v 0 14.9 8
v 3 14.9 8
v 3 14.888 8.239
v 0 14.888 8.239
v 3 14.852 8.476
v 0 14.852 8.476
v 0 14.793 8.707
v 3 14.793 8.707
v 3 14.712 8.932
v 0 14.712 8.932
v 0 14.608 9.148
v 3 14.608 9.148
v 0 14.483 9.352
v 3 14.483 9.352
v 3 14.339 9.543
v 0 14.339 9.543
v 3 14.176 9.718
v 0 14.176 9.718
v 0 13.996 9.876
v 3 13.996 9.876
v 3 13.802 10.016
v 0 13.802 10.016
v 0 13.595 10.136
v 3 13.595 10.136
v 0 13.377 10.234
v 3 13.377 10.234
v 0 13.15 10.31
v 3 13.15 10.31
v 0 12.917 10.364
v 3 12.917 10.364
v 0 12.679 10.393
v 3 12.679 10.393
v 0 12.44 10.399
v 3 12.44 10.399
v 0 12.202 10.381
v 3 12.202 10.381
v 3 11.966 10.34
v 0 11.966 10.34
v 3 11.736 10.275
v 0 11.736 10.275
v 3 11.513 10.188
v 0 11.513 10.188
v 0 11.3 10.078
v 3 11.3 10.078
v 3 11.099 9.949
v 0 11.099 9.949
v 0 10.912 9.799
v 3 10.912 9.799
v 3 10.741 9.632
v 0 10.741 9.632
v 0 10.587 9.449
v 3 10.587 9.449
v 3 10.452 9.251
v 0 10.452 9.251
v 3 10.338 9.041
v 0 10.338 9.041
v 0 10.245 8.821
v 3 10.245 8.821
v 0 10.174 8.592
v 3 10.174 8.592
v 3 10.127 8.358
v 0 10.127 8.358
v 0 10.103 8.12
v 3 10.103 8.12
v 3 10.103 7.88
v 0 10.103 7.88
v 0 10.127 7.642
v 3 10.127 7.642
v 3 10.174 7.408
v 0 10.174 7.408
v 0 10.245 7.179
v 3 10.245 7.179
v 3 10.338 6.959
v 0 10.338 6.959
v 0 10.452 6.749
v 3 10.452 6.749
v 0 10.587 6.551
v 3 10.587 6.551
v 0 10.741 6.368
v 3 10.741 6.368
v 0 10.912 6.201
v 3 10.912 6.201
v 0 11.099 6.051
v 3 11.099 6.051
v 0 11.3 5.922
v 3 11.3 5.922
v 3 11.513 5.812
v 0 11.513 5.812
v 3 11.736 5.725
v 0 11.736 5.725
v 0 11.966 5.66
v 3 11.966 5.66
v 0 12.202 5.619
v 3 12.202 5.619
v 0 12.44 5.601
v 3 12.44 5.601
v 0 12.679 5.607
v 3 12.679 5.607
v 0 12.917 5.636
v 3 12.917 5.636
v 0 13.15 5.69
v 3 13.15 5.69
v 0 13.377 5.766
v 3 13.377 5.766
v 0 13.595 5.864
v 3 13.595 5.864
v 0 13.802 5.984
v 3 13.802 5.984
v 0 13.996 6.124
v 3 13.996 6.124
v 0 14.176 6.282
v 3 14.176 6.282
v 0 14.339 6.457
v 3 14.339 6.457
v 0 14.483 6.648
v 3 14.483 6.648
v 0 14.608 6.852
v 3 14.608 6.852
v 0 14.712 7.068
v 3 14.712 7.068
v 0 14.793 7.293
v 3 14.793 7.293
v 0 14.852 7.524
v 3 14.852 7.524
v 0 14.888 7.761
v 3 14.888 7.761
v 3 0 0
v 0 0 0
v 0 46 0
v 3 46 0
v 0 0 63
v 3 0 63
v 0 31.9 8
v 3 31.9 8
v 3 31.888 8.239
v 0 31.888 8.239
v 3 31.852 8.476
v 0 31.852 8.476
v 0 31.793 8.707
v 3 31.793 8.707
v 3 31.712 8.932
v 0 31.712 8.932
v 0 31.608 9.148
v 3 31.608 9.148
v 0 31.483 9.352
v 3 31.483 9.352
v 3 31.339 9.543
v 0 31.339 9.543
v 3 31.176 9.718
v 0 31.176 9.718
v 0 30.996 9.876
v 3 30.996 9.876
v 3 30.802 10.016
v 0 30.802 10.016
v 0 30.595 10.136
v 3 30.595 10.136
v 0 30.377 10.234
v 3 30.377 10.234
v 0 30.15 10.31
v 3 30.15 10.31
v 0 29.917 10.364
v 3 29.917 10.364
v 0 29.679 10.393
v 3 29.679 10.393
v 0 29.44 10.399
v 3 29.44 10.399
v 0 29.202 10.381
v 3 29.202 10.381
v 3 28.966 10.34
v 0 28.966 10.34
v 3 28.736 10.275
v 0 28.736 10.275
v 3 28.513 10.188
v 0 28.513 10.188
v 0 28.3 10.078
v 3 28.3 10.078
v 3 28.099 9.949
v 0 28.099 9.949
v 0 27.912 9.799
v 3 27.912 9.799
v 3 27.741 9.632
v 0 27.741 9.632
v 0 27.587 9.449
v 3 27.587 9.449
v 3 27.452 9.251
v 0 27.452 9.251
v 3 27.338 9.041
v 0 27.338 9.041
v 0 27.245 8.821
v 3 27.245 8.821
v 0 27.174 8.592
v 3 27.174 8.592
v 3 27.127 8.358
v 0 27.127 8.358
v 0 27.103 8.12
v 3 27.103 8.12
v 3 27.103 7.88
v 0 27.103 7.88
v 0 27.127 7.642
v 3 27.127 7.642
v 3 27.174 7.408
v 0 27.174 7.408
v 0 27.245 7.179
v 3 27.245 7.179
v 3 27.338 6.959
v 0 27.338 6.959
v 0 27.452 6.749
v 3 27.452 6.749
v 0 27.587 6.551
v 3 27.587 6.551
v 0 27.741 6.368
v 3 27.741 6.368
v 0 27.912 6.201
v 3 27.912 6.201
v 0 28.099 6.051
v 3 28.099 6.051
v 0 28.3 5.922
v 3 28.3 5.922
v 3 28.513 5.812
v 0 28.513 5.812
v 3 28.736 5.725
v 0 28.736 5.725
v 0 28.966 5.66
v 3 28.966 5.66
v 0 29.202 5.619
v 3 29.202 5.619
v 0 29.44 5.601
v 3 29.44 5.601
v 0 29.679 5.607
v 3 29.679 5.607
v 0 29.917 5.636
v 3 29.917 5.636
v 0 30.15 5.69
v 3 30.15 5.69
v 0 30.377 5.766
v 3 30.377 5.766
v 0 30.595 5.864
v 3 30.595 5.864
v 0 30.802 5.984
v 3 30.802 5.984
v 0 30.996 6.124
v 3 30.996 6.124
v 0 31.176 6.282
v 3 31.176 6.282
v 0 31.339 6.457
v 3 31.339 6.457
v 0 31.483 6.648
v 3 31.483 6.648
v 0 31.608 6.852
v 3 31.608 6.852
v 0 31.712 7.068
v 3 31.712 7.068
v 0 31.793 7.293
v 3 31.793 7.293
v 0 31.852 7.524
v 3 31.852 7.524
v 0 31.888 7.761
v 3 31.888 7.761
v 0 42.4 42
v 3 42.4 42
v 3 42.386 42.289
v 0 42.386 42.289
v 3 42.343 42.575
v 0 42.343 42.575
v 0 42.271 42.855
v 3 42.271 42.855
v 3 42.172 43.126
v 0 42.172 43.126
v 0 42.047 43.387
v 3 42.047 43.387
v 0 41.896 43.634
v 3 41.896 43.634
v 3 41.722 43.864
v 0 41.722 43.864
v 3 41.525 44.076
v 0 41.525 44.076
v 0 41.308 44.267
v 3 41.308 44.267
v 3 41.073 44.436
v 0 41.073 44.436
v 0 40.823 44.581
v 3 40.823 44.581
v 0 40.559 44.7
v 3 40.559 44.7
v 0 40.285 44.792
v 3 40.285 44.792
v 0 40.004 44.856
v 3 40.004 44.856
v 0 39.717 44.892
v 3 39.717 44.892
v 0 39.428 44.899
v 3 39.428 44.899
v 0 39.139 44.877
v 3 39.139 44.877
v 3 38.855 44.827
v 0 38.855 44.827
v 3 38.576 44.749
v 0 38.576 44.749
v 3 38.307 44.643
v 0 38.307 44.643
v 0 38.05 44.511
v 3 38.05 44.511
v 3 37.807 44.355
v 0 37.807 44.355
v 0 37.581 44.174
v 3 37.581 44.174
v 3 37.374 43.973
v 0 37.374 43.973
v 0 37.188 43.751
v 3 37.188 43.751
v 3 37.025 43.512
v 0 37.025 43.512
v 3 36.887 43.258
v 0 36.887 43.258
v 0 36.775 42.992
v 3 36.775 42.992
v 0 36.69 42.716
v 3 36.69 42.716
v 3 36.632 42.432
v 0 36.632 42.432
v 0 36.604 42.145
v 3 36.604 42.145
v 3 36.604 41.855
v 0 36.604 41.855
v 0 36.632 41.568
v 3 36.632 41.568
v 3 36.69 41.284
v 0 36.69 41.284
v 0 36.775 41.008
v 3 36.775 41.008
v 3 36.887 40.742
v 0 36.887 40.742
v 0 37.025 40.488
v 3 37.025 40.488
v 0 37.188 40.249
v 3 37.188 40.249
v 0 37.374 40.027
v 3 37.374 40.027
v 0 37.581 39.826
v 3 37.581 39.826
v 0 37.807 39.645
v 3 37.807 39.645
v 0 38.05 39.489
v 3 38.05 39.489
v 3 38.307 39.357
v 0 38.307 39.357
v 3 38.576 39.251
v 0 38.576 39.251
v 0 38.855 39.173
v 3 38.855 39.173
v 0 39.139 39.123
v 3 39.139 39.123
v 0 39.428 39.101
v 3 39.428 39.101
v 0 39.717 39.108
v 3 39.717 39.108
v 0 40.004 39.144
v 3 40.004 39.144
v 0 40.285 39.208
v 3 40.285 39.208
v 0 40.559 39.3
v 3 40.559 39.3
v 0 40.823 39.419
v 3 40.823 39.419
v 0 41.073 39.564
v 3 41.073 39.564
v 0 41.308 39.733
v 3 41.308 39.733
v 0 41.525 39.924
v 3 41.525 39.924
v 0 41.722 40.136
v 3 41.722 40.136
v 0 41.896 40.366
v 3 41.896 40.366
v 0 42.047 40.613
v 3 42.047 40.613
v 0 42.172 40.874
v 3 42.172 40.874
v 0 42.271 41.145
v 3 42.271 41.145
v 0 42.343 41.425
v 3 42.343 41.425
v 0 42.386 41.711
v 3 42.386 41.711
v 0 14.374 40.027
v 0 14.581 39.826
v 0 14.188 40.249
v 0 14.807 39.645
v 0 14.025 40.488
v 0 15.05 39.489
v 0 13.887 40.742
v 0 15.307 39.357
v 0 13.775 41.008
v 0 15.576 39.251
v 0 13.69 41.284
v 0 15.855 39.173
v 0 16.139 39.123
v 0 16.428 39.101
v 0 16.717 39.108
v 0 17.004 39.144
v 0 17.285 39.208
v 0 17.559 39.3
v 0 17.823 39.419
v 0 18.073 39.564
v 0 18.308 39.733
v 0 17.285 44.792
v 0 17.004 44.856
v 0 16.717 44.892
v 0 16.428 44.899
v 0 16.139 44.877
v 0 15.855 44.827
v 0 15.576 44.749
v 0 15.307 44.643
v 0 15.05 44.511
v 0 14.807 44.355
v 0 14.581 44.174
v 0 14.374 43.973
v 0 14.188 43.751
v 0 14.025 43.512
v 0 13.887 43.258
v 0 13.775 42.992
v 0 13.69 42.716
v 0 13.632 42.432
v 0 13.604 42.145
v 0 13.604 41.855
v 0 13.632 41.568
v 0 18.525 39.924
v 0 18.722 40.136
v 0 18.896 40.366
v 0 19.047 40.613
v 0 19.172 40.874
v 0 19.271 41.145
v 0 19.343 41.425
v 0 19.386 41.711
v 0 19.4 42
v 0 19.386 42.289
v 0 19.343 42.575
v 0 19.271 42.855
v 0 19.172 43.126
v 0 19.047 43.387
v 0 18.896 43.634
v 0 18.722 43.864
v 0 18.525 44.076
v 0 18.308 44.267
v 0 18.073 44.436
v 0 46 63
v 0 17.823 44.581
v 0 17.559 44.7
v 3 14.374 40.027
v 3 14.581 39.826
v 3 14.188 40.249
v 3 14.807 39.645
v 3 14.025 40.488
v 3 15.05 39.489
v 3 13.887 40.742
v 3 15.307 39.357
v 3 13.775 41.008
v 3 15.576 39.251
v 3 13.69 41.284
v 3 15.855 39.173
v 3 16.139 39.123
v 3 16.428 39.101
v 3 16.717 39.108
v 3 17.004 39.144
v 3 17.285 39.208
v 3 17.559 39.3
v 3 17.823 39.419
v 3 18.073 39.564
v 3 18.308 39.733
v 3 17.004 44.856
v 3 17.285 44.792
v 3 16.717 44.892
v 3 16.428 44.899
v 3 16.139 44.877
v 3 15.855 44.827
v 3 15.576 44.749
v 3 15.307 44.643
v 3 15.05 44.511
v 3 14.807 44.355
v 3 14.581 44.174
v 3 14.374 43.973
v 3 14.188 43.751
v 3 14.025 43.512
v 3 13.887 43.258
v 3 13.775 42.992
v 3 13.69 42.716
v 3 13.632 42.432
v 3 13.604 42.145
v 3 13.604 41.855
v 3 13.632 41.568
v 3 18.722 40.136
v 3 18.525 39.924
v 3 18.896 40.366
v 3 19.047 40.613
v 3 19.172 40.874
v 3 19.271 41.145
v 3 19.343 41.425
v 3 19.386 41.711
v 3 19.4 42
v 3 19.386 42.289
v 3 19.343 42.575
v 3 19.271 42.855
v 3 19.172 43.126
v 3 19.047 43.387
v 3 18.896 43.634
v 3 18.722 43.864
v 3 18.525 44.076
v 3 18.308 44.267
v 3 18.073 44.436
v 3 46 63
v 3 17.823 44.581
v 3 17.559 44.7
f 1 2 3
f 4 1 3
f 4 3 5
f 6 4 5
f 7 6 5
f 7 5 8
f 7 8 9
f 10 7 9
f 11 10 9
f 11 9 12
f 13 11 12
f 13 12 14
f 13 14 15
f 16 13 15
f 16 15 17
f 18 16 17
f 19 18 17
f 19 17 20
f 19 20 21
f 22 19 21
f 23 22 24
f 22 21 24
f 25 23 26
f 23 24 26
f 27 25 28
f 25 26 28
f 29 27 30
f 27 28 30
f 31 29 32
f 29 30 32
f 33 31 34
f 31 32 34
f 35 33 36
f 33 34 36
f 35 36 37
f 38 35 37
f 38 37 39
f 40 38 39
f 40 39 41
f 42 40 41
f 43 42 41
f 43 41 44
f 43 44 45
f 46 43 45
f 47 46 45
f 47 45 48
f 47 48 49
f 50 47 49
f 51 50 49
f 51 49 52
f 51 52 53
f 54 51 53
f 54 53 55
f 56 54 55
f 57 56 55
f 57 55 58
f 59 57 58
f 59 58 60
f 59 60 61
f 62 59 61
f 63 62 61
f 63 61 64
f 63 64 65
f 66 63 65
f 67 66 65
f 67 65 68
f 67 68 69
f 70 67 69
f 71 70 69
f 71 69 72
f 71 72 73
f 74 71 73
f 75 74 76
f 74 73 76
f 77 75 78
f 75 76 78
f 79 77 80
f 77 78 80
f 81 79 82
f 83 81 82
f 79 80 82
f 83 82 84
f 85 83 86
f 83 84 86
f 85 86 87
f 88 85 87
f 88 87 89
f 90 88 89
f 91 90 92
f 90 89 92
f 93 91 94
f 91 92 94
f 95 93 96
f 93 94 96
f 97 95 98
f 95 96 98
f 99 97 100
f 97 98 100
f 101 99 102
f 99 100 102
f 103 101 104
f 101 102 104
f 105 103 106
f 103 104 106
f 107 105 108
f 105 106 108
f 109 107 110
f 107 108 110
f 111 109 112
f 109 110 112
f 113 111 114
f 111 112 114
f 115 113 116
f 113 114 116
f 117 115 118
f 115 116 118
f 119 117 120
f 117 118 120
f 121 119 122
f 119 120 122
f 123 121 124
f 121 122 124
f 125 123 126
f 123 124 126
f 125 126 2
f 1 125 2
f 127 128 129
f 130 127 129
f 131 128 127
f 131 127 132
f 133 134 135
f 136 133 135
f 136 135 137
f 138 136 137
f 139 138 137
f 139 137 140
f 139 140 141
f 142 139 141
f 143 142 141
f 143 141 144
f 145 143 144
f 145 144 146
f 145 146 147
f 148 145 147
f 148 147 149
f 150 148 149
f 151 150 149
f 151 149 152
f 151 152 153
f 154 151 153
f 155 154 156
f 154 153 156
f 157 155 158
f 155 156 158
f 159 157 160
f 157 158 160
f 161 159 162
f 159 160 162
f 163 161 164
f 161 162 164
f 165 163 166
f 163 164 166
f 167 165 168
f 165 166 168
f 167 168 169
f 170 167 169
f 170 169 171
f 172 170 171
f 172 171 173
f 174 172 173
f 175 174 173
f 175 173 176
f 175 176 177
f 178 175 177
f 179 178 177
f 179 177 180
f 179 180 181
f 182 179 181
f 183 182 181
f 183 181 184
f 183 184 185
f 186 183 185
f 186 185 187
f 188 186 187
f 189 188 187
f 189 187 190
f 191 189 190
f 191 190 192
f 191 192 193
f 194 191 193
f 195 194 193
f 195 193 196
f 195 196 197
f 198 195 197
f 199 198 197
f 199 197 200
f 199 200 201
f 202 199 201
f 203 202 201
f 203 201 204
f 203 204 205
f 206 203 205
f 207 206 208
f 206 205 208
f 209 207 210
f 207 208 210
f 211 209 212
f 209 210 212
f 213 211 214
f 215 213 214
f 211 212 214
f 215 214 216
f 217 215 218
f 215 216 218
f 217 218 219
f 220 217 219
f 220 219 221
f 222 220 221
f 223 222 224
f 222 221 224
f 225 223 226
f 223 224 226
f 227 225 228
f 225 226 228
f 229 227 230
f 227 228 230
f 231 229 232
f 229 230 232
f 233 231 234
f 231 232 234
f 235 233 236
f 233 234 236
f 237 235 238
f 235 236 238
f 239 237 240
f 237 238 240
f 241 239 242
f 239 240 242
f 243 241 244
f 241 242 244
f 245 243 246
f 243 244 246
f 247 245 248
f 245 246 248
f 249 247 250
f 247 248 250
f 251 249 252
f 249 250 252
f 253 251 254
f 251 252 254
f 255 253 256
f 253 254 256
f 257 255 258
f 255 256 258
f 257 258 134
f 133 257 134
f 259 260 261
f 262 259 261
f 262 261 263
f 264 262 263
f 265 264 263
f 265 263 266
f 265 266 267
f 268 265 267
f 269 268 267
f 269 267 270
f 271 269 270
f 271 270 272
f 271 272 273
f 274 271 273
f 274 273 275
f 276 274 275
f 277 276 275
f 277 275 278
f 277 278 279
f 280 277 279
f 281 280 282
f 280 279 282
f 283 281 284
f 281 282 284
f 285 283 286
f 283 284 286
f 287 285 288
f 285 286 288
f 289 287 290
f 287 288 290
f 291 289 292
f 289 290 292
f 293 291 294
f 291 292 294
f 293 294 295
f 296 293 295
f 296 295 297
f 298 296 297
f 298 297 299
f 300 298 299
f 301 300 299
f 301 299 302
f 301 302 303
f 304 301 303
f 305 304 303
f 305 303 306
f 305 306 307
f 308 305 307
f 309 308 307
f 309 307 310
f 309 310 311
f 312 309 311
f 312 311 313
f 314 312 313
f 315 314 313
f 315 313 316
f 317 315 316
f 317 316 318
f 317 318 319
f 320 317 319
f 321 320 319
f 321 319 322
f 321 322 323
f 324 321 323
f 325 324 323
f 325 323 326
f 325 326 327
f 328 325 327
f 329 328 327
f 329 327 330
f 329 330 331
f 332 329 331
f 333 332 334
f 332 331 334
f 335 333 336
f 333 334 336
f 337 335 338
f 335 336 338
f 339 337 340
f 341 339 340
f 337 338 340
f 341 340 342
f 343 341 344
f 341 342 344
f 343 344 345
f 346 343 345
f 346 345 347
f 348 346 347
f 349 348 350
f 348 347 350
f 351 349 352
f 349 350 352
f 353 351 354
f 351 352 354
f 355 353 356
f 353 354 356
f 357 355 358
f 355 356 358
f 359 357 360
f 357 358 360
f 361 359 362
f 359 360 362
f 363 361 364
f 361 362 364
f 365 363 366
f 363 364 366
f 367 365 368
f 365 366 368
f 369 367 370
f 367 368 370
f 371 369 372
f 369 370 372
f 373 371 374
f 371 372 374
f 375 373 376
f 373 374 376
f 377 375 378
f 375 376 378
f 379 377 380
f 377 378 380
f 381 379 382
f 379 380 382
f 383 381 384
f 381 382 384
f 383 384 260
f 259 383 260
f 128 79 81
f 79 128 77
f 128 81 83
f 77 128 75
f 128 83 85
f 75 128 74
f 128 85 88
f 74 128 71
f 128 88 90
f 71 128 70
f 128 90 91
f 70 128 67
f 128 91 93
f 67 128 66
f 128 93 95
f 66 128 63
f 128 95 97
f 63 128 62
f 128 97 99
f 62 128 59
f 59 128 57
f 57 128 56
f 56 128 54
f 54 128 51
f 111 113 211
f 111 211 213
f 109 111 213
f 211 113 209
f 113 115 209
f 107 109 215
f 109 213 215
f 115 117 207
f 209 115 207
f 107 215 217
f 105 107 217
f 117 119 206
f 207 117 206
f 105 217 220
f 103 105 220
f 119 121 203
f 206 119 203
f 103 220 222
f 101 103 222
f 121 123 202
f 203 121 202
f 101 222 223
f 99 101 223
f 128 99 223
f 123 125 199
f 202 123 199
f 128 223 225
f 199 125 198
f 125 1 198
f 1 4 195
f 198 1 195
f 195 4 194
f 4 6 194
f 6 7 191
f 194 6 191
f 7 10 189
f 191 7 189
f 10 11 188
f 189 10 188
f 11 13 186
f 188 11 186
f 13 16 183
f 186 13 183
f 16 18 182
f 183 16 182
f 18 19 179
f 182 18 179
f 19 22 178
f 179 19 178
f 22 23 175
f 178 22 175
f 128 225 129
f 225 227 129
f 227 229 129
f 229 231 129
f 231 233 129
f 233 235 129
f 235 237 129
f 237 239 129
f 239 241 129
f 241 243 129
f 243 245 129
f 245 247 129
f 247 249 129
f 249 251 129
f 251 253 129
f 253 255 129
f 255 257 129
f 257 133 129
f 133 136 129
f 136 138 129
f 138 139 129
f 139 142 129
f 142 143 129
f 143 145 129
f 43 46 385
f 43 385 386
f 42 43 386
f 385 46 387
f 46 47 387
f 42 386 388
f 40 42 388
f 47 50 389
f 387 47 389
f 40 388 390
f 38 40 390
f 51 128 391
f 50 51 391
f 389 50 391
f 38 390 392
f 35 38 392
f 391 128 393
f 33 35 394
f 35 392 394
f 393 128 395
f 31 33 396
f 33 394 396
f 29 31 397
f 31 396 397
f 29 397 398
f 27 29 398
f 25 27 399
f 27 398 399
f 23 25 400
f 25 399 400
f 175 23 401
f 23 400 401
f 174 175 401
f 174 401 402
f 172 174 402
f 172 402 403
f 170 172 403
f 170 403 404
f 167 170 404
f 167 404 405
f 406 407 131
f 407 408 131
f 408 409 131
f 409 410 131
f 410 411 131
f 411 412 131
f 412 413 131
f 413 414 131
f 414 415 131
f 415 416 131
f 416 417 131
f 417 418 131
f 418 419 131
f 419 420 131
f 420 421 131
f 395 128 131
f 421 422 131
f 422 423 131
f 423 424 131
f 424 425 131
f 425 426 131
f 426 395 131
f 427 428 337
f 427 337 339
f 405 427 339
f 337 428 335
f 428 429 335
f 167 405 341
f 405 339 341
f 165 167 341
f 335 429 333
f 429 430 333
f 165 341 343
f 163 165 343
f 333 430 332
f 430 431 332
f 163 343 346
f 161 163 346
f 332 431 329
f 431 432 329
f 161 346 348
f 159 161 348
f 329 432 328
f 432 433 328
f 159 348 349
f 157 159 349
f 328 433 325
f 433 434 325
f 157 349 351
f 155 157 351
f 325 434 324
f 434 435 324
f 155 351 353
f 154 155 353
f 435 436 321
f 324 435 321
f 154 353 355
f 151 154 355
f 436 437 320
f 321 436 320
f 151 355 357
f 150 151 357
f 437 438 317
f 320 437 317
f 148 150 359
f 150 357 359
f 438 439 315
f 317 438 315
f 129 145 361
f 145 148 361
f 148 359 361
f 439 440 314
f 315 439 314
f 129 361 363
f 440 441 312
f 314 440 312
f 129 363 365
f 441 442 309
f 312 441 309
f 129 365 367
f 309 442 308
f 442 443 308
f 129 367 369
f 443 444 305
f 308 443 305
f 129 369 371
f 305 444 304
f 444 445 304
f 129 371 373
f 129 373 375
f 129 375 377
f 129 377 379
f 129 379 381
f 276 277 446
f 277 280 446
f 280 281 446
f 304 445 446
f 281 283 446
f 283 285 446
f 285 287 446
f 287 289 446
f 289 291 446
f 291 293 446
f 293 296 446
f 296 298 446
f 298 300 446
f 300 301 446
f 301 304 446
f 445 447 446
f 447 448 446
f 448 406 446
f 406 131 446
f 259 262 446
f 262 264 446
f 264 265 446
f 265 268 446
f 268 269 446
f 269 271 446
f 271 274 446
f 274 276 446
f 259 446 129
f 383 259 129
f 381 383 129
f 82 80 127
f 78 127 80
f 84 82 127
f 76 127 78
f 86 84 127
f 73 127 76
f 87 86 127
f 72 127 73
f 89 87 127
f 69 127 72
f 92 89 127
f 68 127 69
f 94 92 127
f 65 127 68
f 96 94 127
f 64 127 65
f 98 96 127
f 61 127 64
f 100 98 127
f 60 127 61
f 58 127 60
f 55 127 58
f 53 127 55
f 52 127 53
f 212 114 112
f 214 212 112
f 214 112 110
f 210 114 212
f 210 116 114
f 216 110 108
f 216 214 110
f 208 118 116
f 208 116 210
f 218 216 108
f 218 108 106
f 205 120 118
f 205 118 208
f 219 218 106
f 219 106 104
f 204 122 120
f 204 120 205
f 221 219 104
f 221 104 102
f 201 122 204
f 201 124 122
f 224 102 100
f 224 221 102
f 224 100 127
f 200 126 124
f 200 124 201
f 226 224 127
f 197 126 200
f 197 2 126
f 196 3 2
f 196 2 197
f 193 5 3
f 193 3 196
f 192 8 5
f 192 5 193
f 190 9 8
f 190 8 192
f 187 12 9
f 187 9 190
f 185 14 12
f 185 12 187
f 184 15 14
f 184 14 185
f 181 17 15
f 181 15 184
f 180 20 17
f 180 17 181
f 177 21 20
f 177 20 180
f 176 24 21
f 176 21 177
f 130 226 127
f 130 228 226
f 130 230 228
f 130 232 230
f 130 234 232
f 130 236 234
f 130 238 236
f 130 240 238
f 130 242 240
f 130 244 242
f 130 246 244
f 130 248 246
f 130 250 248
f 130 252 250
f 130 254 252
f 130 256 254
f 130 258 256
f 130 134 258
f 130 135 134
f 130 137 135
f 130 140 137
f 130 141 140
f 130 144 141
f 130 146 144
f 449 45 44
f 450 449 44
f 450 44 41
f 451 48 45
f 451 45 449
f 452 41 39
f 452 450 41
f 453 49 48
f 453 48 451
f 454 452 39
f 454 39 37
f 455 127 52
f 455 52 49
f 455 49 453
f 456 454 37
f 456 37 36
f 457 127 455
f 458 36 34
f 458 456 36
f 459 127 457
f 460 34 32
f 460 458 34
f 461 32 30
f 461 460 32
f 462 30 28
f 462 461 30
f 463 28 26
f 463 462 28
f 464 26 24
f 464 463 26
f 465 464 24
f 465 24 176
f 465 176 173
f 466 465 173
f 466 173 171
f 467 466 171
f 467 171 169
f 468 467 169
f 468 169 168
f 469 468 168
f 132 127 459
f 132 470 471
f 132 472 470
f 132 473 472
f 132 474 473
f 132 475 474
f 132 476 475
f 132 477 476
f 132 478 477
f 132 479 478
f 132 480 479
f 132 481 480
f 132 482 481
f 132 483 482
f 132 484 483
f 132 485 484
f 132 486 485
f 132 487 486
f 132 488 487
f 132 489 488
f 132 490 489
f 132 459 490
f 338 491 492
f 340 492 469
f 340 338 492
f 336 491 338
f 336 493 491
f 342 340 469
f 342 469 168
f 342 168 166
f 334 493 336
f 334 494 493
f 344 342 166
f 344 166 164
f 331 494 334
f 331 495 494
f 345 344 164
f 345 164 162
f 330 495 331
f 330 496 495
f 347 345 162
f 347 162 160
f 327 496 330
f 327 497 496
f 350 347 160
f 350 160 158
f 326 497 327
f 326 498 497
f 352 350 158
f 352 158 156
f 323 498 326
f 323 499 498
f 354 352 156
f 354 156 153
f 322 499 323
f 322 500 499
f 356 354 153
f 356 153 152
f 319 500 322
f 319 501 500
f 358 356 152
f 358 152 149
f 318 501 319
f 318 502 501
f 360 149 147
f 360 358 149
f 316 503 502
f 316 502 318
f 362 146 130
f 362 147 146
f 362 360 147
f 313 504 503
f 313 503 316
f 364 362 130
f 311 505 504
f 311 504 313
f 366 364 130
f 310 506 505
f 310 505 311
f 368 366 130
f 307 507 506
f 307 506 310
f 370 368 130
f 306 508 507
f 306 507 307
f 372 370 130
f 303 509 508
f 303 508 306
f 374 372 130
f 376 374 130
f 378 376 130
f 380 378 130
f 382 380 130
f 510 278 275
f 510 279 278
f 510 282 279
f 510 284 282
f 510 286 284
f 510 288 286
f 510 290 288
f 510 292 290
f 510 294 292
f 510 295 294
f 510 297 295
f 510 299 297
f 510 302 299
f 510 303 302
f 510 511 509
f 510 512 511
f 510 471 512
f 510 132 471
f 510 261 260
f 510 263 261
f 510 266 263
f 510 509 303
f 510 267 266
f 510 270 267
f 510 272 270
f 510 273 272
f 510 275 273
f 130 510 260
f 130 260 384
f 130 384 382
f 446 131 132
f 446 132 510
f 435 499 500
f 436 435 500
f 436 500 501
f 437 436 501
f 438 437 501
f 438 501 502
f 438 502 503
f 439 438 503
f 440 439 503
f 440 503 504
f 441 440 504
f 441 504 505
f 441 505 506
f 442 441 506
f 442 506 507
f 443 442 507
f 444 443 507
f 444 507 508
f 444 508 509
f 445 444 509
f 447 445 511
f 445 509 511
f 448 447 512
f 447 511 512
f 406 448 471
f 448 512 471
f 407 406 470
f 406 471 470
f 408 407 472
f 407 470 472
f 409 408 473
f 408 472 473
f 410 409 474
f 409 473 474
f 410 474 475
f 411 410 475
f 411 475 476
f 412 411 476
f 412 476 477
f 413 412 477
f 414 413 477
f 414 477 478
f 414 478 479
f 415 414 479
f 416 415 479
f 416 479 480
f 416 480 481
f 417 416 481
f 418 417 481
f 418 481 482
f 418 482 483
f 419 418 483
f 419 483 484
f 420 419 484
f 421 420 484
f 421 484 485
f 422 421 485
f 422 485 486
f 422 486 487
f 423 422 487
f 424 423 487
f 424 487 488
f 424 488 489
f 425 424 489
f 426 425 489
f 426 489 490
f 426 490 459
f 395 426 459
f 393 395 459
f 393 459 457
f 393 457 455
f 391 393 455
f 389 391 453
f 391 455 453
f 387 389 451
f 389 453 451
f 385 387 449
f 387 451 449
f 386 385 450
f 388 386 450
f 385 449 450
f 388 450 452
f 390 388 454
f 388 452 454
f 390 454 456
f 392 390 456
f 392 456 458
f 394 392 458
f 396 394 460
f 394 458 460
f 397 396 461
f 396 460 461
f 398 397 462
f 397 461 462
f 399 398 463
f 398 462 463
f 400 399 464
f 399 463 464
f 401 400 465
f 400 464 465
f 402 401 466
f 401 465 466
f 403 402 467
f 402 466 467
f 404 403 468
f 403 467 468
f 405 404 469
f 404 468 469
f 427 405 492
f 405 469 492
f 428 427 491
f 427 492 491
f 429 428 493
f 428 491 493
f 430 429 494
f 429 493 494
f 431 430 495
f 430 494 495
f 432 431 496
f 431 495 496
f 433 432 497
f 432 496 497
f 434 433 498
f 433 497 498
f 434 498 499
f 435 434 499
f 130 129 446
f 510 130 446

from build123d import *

# Parameters (mm, degrees)
F0_W     = 46
F0_H     = 63
F1_DEPTH = 3
F2_W     = 46
F2_H     = 63
F2_R     = 2.4
F2_R_2   = 2.9
F3_DEPTH = 3.001


with BuildPart() as f1:
    # F0 (on Right) → F1 (new body)
    with BuildSketch(Plane.YZ):
        with Locations((23, 31.5)):
            Rectangle(F0_W, F0_H)
    extrude(amount=F1_DEPTH)

    # F2 (on face) → F3 (intersect, through all)
    with BuildSketch(Plane.YZ.offset(3)):
        with Locations((23, 31.5)):
            Rectangle(F2_W, F2_H)
        with Locations((12.5, 8)):
            Circle(F2_R, mode=Mode.SUBTRACT)
        with Locations((29.5, 8)):
            Circle(F2_R, mode=Mode.SUBTRACT)
        with Locations((16.5, 42)):
            Circle(F2_R_2, mode=Mode.SUBTRACT)
        with Locations((39.5, 42)):
            Circle(F2_R_2, mode=Mode.SUBTRACT)
    extrude(amount=-F3_DEPTH, mode=Mode.INTERSECT)


solid = f1.part
